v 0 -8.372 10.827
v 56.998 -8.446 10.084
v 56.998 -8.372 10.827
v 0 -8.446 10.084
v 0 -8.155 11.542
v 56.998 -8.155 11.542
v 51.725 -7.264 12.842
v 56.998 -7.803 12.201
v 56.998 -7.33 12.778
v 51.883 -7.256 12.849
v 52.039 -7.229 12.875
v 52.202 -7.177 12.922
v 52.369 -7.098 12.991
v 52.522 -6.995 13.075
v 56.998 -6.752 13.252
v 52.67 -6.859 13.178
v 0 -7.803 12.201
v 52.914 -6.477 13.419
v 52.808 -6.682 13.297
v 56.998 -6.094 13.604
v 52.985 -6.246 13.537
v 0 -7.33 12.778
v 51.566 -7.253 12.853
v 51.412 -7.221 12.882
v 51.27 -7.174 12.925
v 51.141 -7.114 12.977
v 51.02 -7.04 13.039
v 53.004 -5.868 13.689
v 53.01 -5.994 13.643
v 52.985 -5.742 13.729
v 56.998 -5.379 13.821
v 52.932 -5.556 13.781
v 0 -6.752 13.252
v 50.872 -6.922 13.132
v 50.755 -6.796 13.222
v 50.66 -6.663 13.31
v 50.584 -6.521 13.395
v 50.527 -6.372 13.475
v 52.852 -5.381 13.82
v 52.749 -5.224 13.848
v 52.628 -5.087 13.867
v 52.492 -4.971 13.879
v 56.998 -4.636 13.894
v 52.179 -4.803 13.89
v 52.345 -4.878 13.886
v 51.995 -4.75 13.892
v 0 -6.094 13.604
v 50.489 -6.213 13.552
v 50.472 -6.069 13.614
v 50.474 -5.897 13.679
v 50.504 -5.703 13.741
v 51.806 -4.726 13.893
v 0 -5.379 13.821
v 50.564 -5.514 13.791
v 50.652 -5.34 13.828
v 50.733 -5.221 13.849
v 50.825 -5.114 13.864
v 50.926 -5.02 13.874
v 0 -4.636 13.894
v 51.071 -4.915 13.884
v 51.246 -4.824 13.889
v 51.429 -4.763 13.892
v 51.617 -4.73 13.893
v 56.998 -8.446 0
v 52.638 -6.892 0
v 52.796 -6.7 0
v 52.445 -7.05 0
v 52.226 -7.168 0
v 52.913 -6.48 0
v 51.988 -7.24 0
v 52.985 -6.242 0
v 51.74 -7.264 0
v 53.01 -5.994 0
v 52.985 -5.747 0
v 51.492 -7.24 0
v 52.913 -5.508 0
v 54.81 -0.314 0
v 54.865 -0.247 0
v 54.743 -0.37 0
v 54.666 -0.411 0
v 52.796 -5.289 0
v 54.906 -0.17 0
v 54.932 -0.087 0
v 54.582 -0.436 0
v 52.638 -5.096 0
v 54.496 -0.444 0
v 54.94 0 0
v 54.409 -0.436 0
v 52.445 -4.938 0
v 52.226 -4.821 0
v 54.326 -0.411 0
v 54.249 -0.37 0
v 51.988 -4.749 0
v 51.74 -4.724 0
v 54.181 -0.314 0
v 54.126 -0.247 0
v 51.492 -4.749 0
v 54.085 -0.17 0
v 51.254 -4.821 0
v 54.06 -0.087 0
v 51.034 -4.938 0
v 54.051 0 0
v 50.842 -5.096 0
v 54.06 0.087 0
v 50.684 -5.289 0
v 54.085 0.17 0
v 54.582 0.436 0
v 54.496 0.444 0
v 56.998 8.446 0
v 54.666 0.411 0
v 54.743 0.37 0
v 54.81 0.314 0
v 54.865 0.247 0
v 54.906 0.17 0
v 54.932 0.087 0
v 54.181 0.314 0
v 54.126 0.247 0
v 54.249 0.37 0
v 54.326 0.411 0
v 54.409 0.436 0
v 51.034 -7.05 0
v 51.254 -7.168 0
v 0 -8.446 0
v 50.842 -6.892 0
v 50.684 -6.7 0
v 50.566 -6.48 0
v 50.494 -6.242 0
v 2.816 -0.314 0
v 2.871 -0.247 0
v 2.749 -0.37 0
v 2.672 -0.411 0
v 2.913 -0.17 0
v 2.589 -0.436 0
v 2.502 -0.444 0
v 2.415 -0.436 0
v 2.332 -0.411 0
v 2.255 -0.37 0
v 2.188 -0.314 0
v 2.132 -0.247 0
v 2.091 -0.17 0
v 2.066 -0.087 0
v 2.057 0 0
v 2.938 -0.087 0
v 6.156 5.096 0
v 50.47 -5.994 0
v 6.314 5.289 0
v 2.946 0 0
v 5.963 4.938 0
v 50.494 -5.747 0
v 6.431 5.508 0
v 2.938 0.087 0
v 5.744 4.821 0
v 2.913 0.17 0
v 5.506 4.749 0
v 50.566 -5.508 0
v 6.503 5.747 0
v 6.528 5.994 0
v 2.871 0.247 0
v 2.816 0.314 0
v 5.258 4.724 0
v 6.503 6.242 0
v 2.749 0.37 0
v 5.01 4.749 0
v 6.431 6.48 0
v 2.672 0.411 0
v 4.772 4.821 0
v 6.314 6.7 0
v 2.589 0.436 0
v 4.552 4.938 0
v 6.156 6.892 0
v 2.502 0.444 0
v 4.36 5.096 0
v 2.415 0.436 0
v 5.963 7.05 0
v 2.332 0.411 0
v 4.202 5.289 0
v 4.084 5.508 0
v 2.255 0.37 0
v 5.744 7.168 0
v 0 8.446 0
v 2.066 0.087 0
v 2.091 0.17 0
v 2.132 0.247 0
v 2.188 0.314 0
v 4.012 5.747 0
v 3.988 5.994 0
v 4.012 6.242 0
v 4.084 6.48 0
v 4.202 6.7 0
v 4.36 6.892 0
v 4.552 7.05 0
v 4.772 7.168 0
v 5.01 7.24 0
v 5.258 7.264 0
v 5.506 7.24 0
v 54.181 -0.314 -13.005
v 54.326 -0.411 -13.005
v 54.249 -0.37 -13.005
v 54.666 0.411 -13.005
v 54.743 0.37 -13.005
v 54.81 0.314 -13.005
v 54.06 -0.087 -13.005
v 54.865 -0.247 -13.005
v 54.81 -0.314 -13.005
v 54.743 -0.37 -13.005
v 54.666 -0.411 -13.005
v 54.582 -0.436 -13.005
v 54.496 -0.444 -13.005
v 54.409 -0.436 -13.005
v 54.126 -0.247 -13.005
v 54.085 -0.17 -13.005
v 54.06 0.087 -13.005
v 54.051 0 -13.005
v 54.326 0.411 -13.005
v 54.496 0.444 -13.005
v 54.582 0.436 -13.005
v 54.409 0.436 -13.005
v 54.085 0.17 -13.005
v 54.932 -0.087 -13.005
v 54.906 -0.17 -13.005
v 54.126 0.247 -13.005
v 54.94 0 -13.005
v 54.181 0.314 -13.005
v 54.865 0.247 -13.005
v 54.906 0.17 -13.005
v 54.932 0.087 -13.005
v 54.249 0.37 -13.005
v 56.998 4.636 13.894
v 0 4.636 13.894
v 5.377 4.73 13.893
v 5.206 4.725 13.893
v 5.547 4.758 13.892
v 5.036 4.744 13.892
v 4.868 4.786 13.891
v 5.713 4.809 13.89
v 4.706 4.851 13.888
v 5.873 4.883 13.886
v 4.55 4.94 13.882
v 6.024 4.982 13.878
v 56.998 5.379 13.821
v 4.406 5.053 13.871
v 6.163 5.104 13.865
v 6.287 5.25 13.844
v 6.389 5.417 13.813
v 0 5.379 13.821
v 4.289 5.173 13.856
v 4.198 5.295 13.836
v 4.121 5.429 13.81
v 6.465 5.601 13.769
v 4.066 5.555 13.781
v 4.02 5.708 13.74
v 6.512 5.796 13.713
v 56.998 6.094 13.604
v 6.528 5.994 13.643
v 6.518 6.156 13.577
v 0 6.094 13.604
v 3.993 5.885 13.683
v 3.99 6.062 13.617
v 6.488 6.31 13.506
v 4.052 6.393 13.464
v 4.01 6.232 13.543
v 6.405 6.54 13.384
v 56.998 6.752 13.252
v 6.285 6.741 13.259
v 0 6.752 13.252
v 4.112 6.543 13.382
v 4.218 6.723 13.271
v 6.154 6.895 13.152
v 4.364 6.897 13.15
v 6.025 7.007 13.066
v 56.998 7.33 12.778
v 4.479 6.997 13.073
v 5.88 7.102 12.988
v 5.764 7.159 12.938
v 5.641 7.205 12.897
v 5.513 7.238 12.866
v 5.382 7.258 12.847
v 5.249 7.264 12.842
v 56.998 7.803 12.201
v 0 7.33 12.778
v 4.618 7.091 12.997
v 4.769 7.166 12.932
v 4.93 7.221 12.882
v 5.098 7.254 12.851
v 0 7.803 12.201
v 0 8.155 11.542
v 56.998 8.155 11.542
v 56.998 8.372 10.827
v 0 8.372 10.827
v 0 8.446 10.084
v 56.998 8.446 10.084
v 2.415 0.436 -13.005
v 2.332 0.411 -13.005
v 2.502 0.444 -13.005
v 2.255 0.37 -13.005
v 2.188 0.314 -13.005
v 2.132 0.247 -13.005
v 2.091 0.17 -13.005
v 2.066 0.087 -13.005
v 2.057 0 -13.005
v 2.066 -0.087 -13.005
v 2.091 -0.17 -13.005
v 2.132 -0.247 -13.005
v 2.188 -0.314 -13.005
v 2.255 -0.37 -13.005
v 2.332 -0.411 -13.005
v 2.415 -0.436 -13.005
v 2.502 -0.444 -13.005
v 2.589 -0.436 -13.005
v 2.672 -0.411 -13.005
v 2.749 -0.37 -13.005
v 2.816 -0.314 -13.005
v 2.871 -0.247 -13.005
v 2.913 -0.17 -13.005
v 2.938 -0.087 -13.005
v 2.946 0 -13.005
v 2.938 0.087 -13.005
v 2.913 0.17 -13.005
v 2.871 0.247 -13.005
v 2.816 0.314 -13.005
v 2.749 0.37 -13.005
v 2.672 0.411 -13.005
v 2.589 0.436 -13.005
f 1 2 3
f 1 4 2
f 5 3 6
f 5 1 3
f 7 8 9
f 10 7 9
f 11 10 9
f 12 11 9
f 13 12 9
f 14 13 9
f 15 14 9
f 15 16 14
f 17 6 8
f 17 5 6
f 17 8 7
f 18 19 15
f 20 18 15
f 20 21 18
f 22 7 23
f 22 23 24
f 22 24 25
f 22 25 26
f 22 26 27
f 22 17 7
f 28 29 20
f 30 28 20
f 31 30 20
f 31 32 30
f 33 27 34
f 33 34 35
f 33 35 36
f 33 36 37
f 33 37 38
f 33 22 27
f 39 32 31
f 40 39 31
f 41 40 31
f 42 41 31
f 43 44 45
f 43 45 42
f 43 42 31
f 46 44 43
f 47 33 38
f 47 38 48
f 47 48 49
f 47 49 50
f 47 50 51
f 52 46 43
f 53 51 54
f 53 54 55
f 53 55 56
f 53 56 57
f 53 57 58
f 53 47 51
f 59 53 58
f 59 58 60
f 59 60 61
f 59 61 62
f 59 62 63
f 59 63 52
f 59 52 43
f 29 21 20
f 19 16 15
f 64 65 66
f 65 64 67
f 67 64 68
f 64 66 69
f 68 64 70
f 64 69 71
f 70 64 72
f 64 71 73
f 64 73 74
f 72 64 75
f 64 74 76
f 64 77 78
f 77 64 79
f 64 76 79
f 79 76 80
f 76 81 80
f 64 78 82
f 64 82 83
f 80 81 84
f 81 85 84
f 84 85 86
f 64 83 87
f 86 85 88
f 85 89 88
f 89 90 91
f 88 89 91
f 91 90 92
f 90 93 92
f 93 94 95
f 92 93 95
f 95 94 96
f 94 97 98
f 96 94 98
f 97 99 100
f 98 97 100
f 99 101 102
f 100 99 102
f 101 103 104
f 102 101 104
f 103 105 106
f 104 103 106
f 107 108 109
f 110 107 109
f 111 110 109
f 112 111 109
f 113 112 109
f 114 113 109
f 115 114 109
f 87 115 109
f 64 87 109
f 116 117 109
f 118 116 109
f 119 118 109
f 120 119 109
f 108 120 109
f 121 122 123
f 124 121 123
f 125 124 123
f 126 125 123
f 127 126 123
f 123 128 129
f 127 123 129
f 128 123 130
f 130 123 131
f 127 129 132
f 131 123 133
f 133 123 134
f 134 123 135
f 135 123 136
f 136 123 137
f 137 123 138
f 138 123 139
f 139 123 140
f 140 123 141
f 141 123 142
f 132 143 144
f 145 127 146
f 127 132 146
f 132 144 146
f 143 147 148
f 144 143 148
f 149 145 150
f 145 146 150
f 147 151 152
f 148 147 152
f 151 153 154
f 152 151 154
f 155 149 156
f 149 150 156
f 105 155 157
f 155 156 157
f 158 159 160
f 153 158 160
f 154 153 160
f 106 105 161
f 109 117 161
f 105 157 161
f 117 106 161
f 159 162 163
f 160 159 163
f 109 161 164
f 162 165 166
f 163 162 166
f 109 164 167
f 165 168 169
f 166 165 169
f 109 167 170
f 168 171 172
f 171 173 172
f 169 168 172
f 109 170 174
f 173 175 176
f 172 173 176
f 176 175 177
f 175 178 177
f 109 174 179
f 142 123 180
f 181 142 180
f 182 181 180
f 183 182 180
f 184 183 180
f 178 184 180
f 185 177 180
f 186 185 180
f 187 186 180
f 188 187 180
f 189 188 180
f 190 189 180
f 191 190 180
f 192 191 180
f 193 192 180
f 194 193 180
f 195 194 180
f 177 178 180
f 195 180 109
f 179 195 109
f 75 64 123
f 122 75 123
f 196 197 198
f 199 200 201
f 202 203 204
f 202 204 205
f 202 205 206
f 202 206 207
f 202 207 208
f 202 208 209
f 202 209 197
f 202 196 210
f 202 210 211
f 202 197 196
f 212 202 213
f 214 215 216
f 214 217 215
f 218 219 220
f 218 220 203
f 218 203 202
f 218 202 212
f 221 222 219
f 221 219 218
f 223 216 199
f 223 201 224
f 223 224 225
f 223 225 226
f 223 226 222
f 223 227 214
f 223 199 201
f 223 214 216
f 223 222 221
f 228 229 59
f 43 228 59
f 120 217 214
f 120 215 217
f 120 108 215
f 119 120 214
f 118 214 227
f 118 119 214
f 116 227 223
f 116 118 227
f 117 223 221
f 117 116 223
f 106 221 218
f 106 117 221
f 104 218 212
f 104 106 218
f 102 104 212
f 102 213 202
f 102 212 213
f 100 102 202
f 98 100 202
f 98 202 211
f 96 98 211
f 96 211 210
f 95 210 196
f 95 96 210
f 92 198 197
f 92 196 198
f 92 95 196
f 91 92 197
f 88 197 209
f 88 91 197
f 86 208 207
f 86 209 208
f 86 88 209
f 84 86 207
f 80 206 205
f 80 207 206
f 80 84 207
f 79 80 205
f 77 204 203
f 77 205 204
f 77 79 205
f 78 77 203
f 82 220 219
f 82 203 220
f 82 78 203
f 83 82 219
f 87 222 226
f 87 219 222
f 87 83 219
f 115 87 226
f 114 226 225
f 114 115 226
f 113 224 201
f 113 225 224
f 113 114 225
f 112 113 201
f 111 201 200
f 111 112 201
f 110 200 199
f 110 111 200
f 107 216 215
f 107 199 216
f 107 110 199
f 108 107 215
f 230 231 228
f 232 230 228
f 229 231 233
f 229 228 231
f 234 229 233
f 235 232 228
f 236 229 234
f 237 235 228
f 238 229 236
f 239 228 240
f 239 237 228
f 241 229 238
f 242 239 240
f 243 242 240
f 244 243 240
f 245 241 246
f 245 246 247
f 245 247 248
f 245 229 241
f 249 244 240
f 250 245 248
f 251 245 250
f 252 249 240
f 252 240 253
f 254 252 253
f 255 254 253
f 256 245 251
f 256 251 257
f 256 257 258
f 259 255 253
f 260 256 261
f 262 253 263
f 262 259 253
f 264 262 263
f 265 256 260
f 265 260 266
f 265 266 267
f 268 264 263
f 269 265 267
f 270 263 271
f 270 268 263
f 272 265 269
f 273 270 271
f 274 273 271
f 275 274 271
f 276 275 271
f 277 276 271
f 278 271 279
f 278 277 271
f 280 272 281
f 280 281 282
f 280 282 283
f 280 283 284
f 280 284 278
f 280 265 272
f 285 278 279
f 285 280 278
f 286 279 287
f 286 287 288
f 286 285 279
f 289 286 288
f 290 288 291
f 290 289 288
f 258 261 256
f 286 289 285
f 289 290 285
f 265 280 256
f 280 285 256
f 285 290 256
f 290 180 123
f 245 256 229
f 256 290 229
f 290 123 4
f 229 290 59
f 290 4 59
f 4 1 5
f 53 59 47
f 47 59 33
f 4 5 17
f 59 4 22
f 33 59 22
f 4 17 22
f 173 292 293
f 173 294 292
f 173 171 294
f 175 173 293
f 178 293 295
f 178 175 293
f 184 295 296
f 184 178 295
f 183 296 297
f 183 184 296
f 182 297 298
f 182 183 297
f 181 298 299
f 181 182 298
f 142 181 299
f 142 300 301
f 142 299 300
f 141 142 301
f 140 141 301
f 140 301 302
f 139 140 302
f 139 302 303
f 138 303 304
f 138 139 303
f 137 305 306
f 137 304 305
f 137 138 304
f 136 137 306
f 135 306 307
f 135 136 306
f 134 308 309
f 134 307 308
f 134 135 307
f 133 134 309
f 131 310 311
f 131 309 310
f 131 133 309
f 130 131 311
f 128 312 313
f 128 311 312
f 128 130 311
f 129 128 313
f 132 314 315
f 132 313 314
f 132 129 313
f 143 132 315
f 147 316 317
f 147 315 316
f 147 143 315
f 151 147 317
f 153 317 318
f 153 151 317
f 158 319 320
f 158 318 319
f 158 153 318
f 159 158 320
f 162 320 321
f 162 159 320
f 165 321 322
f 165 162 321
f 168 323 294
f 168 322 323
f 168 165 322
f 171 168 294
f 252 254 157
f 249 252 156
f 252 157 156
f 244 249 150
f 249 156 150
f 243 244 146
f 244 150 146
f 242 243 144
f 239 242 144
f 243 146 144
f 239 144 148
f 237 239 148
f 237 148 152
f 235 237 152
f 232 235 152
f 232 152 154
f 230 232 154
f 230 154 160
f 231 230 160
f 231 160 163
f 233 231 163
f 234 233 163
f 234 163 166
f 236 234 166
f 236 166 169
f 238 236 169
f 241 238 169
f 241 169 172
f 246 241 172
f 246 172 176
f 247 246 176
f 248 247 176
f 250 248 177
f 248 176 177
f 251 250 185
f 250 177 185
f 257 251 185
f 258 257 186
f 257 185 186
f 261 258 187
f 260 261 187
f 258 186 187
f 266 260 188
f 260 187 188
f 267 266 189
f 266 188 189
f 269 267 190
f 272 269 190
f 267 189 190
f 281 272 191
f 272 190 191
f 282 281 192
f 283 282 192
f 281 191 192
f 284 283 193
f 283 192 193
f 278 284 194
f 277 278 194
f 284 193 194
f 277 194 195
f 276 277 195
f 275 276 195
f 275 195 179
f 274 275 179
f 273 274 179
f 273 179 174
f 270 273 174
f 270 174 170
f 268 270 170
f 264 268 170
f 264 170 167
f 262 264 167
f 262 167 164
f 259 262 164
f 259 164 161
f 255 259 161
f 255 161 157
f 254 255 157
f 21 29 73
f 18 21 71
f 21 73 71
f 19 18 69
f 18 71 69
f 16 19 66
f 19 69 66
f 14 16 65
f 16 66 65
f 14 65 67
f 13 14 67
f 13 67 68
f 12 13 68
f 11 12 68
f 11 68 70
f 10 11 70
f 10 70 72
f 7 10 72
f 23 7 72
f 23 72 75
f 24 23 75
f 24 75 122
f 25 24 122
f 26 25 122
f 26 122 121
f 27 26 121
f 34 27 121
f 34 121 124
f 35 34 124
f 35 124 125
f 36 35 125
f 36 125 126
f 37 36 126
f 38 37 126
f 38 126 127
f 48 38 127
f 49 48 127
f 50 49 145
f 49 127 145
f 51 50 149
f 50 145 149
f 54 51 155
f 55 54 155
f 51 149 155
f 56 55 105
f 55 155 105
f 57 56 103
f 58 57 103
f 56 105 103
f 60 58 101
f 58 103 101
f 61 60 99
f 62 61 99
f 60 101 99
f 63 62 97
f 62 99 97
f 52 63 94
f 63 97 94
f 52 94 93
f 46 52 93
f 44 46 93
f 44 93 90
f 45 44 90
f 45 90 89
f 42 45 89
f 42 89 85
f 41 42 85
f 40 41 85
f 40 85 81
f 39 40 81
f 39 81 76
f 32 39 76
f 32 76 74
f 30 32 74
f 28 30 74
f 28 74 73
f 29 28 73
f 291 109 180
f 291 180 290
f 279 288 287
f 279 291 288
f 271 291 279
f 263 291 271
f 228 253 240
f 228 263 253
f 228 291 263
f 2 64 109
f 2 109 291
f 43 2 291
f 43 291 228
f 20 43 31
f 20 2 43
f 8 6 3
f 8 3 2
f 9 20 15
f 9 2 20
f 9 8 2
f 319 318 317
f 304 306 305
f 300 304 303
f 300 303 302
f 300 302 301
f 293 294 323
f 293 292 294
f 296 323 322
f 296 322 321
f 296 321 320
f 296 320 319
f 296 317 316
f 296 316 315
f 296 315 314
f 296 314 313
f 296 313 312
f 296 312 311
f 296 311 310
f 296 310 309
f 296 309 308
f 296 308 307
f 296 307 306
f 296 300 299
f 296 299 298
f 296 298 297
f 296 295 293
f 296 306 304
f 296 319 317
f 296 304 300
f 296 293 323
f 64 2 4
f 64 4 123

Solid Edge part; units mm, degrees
sketch "Sketch1" plane through (0, 0, 0) normal (1, 0, 0) x (0, 1, 0)
  arc A0 (-4.6355, 13.8938) -> (-8.4455, 10.0838) centre (-4.6355, 10.0838) ccw
  line L0 (-8.4455, 10.0838) -> (-8.4455, 0)
  line L1 (-8.4455, 0) -> (8.4455, 0)
  line L2 (8.4455, 0) -> (8.4455, 10.0838)
  arc A1 (4.6355, 13.8938) -> (8.4455, 10.0838) centre (4.6355, 10.0838) cw
  line L3 (4.6355, 13.8938) -> (-4.6355, 13.8938)
extrude "Protrusion1" add sketch "Sketch1" along normal blind 56.9976
sketch "Sketch2" plane through (28.4988, 0, 0) normal (0, 0, -1) x (0, 1, 0)
  circle A0 centre (0, 25.9969) radius 0.4445
  circle A1 centre (0, -25.9969) radius 0.4445
  dimension "D1" = 51.9938
  dimension "D2" = 0.889
extrude "ExtrudedProtrusion_2" add sketch "Sketch2" along normal blind 13.0048
sketch "Sketch3" plane through (28.4988, 0, 0) normal (0, 0, -1) x (1, 0, 0)
  circle A0 centre (-23.241, -5.9944) radius 1.27
  circle A1 centre (23.241, 5.9944) radius 1.27
  dimension "D1" = 46.482
  dimension "D2" = 11.9888
  dimension "D3" = 2.54
extrude "Cutout1" cut sketch "Sketch3" against normal through all
